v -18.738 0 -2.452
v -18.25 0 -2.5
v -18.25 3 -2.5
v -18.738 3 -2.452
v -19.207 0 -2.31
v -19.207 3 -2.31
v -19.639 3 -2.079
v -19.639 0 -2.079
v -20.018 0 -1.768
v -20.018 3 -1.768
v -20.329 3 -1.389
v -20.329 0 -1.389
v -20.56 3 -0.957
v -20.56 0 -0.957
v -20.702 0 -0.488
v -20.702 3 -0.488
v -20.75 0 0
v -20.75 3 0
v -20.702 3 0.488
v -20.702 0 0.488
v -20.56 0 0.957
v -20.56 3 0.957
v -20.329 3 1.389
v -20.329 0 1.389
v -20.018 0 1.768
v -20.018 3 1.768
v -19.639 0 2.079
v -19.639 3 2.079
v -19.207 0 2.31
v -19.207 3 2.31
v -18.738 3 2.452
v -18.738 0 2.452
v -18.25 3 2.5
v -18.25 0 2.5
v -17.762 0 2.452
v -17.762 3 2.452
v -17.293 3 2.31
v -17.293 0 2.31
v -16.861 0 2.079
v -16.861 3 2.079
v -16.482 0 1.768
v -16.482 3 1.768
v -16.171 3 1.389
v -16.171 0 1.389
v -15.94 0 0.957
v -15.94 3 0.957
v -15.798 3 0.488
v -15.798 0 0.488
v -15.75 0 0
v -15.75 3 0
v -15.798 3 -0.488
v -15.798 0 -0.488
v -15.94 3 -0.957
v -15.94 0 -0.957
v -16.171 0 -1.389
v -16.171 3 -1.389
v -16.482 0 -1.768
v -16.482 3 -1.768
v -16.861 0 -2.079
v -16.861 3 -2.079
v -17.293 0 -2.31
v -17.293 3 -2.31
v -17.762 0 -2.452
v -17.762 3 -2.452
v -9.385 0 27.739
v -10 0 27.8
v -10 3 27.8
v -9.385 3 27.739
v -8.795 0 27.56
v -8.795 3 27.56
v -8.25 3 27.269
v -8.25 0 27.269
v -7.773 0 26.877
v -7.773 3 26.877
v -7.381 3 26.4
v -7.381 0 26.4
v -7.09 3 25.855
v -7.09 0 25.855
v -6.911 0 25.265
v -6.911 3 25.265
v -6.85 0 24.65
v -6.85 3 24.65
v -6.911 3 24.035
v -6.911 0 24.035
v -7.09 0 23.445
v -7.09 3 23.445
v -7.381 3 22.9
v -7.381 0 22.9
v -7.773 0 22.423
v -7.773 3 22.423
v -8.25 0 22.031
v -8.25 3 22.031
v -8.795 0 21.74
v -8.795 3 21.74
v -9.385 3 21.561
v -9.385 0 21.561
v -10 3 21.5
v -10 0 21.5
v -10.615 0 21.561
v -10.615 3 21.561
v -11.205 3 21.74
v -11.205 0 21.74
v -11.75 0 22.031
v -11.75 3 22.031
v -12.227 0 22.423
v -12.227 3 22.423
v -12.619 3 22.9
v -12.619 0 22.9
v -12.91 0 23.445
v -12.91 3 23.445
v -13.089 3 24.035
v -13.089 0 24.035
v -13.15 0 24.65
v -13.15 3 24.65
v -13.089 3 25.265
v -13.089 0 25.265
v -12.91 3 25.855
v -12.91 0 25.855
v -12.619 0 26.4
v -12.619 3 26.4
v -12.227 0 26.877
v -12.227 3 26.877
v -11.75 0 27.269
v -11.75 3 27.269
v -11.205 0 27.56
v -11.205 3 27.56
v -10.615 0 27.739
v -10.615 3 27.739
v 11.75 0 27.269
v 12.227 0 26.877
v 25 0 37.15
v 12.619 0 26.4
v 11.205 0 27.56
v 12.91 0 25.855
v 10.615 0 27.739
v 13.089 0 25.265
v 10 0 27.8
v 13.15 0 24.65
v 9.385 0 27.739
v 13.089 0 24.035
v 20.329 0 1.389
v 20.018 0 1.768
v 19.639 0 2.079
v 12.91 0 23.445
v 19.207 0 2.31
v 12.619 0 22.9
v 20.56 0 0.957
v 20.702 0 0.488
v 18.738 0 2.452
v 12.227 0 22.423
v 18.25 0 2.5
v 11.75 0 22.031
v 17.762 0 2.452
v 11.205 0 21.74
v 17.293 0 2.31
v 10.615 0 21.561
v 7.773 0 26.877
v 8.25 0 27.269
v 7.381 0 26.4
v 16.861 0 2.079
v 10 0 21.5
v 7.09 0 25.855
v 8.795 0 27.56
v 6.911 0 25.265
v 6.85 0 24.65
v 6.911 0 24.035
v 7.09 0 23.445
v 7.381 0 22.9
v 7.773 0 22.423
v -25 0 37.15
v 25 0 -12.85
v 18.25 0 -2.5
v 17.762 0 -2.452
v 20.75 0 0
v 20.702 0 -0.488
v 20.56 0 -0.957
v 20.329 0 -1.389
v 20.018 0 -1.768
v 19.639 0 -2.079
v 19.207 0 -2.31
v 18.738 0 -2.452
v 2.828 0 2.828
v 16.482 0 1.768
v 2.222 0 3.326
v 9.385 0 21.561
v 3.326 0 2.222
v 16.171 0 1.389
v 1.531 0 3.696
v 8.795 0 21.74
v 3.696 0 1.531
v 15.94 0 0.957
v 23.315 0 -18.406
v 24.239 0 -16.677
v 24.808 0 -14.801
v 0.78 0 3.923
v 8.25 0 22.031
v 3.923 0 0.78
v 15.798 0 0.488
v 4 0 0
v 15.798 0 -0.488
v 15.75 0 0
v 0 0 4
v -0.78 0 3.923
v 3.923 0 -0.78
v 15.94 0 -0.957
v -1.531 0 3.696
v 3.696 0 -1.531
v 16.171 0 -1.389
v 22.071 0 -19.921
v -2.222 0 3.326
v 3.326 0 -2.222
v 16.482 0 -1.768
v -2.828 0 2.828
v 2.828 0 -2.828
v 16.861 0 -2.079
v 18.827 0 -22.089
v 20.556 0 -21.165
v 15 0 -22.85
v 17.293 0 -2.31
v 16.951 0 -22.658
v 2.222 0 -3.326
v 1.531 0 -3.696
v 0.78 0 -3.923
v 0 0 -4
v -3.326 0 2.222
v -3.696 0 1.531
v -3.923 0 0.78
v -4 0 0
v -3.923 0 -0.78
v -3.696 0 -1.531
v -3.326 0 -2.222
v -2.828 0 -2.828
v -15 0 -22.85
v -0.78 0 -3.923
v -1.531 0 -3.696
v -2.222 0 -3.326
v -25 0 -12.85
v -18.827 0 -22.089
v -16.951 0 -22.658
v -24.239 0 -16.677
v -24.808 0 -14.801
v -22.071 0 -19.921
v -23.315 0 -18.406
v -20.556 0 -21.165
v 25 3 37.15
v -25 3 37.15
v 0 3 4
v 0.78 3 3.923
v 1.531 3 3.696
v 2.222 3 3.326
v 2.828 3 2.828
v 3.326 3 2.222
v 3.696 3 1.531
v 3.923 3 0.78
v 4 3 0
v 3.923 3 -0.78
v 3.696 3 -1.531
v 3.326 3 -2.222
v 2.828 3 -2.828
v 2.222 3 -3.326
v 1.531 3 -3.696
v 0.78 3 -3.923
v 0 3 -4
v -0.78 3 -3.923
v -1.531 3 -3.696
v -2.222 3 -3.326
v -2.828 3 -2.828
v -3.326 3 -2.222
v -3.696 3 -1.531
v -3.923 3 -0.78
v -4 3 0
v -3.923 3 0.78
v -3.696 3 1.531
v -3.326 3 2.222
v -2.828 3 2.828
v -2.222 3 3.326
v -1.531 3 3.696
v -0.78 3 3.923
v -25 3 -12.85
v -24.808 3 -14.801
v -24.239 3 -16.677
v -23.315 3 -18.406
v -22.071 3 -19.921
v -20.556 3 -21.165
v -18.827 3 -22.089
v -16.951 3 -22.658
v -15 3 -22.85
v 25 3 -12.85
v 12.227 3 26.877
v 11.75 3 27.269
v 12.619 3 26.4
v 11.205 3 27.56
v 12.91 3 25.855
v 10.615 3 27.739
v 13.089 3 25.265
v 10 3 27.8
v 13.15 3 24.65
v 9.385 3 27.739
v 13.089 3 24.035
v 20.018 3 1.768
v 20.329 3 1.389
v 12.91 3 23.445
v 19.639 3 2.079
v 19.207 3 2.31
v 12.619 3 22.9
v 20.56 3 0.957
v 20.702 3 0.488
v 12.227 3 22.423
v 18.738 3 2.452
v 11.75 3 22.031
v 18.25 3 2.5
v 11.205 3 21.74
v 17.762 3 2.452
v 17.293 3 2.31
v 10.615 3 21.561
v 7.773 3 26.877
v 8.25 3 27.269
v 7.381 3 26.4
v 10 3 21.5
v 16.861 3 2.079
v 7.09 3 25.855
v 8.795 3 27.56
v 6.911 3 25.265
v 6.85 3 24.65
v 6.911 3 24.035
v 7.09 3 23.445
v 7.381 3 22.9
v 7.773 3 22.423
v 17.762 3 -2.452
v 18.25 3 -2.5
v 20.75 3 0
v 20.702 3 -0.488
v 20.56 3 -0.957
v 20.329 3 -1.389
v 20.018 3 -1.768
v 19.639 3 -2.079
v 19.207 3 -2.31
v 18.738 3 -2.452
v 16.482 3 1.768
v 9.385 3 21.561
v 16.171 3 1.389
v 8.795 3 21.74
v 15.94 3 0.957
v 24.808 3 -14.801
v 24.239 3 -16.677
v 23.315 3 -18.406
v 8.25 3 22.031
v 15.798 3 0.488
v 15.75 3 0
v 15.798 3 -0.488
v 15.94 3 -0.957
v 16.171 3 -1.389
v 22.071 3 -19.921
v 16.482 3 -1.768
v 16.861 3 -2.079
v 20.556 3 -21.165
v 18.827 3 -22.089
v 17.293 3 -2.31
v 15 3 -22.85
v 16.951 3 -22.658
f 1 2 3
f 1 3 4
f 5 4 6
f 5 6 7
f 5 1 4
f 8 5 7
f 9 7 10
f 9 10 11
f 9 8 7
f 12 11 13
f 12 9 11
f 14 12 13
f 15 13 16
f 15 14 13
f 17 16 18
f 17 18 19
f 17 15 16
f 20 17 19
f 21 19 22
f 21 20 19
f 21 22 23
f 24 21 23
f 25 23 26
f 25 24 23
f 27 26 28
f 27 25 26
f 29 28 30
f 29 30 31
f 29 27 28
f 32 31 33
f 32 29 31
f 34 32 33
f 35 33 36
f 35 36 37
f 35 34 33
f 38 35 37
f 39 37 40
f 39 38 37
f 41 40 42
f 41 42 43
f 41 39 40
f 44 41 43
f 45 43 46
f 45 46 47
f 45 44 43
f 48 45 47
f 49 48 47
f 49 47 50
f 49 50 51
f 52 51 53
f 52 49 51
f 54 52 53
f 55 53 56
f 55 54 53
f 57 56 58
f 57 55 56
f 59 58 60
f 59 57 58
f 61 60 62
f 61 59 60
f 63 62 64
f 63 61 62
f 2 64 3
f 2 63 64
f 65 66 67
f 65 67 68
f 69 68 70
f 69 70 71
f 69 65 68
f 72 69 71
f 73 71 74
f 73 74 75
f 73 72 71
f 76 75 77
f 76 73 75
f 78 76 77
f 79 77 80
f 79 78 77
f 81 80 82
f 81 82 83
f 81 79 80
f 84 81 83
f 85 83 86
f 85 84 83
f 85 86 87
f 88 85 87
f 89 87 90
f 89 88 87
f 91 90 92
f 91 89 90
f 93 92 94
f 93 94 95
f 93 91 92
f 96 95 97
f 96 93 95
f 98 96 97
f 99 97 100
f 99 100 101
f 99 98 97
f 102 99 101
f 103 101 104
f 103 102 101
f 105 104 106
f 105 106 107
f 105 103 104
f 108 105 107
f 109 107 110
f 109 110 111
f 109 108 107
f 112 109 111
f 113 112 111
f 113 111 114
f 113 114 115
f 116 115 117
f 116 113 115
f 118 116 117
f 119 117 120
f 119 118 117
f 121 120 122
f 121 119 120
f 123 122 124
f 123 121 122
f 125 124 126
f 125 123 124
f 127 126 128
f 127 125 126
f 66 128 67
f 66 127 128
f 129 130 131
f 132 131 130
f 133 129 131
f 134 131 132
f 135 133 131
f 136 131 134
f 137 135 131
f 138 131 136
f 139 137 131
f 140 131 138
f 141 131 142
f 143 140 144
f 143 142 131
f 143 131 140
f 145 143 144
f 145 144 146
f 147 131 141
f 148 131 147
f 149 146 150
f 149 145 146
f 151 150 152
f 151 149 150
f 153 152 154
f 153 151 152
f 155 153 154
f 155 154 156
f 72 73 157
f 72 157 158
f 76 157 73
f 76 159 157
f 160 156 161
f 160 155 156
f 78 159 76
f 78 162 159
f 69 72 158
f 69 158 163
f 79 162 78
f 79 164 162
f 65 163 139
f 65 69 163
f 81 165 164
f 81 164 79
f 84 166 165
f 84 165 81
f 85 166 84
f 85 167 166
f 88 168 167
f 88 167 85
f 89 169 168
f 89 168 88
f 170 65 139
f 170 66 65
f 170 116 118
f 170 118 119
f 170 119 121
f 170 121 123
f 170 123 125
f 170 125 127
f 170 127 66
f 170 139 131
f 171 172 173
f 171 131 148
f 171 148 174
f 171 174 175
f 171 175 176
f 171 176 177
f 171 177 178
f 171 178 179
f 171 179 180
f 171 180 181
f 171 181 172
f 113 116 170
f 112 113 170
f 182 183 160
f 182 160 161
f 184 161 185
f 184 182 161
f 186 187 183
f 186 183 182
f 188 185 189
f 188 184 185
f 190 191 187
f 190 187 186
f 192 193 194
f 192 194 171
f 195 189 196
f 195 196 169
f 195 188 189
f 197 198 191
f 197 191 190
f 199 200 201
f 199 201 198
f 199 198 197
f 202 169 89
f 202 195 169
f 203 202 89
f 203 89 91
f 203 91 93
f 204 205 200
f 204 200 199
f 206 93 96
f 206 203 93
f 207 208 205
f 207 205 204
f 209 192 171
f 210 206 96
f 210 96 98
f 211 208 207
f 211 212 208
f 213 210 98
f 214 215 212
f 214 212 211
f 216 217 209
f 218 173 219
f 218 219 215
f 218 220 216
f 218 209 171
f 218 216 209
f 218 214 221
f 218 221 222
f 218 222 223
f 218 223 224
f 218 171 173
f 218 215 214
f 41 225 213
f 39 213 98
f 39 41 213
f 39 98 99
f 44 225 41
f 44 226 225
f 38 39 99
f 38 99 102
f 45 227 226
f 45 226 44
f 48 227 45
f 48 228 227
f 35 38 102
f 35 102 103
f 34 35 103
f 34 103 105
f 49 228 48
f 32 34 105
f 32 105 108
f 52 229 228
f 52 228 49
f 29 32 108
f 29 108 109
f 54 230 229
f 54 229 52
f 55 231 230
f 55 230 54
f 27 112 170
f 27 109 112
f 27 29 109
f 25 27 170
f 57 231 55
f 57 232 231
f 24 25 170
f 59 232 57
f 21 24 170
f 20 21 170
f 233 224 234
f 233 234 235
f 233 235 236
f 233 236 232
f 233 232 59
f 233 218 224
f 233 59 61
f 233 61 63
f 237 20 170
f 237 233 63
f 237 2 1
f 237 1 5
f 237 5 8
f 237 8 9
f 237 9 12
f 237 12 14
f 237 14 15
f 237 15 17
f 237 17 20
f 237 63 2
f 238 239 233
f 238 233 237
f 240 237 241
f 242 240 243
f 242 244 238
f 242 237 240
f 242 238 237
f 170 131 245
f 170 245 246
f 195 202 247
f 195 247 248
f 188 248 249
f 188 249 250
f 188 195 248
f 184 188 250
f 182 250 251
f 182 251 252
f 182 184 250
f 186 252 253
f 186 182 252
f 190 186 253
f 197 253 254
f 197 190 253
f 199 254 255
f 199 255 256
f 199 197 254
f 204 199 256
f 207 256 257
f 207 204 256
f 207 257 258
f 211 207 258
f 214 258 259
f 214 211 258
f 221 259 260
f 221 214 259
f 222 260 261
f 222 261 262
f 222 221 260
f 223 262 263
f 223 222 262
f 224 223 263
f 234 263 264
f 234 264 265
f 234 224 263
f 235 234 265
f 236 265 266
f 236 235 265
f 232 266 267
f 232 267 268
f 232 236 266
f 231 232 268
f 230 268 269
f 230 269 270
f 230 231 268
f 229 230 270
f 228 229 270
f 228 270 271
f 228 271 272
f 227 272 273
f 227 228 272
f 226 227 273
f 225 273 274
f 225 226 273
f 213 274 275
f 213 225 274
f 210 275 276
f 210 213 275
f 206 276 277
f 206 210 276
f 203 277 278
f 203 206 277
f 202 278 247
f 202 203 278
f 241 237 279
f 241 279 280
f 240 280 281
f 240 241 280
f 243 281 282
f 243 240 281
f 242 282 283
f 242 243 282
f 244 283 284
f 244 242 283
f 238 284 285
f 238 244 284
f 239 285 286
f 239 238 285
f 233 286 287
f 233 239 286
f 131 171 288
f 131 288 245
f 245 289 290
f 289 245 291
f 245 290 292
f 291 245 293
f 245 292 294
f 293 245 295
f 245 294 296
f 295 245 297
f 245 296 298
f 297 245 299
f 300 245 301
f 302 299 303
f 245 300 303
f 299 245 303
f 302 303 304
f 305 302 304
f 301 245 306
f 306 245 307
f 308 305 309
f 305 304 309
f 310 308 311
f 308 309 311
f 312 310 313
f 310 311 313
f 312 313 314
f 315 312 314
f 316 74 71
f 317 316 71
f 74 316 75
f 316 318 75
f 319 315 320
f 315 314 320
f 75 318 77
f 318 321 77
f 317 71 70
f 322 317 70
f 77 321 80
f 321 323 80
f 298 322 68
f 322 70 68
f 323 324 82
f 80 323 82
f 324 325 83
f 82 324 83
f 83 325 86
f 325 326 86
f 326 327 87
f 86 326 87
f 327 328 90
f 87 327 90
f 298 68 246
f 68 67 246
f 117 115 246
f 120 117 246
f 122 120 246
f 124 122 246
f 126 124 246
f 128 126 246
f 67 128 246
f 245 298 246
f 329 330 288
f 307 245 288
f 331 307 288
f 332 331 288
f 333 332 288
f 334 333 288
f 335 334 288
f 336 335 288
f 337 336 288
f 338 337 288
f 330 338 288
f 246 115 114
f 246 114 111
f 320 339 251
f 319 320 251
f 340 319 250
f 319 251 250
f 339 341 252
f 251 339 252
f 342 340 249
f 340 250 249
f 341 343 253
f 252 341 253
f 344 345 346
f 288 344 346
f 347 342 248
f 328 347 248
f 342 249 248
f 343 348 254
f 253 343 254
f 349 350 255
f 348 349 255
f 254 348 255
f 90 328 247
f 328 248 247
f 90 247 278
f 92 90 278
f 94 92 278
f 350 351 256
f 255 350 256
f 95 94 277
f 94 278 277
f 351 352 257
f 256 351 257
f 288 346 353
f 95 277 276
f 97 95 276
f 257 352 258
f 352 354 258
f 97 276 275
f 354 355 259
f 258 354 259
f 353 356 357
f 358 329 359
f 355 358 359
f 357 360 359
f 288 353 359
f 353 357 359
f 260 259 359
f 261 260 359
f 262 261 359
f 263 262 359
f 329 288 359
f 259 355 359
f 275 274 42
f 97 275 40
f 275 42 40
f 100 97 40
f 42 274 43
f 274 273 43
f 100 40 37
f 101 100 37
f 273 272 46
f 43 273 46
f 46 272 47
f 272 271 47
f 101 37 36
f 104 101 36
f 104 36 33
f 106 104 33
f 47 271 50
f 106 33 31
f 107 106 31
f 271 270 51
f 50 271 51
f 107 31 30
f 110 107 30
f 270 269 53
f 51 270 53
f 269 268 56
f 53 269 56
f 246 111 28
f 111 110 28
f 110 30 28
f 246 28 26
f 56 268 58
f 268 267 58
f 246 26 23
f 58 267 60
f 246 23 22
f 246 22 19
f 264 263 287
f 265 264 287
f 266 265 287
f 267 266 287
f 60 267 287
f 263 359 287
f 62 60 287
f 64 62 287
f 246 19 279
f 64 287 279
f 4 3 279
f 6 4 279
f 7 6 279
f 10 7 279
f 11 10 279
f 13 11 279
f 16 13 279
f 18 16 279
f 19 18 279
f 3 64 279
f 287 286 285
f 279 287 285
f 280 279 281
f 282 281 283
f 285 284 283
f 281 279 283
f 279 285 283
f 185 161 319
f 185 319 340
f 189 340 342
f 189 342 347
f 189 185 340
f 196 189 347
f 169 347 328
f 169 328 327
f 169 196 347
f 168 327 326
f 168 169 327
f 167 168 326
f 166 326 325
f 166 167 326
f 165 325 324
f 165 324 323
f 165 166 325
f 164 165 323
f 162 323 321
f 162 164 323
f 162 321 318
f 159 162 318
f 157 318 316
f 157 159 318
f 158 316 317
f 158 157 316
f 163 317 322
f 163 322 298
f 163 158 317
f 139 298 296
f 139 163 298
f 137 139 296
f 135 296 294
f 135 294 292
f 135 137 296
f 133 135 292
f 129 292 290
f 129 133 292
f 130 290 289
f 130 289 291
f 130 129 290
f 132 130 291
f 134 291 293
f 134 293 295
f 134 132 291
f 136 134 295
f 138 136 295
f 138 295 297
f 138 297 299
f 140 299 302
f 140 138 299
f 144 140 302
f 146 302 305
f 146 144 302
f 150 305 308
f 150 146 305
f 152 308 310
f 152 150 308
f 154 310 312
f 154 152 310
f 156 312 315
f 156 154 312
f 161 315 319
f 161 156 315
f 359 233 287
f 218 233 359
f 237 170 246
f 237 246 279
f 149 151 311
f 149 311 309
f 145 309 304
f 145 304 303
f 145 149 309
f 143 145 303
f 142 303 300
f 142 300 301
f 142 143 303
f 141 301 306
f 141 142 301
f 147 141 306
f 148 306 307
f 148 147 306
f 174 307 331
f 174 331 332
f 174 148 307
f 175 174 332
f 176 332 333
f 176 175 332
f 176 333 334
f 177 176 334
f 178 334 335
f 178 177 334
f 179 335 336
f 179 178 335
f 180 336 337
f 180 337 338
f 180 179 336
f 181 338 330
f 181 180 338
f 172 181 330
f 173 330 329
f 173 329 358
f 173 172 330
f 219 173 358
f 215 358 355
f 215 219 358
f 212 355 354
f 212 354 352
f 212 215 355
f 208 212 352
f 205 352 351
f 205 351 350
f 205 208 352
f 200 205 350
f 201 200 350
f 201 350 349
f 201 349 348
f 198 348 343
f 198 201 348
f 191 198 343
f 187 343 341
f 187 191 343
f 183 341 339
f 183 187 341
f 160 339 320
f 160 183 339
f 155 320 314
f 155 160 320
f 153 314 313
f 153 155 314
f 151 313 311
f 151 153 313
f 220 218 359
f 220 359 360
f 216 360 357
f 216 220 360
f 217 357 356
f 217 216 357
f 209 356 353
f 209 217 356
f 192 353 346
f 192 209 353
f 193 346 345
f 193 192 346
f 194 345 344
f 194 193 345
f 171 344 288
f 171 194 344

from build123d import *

# Parameters (mm, degrees)
CROQUIS1_R              = 4
CROQUIS1_R_2            = 2.5
CROQUIS1_R_3            = 3.15
SALIENTE_EXTRUIR1_DEPTH = 3


with BuildPart() as part:
    # Croquis1 → Saliente-Extruir1 (new body)
    with BuildSketch(Plane(origin=(0, 0, 0), x_dir=(1, 0, 0), z_dir=(0, 1, 0))):
        with BuildLine():
            Line((25, -37.15), (-25, -37.15))
            Line((-25, -37.15), (-25, 12.85))
            ThreePointArc((-25, 12.85), (-22.071067812, 19.921067812), (-15, 22.85))
            Line((-15, 22.85), (15, 22.85))
            ThreePointArc((15, 22.85), (22.071067812, 19.921067812), (25, 12.85))
            Line((25, 12.85), (25, -37.15))
        make_face()
        with Locations(Location((0, 0, 0), (0, 0, 270))):
            Circle(CROQUIS1_R, mode=Mode.SUBTRACT)
        with Locations(Location((18.25, 0, 0), (0, 0, 270))):
            Circle(CROQUIS1_R_2, mode=Mode.SUBTRACT)
        with Locations(Location((-18.25, 0, 0), (0, 0, 90))):
            Circle(CROQUIS1_R_2, mode=Mode.SUBTRACT)
        with Locations(Location((-10, -24.65, 0), (0, 0, 270))):
            Circle(CROQUIS1_R_3, mode=Mode.SUBTRACT)
        with Locations(Location((10, -24.65, 0), (0, 0, 90))):
            Circle(CROQUIS1_R_3, mode=Mode.SUBTRACT)
    extrude(amount=SALIENTE_EXTRUIR1_DEPTH)


solid = part.part
